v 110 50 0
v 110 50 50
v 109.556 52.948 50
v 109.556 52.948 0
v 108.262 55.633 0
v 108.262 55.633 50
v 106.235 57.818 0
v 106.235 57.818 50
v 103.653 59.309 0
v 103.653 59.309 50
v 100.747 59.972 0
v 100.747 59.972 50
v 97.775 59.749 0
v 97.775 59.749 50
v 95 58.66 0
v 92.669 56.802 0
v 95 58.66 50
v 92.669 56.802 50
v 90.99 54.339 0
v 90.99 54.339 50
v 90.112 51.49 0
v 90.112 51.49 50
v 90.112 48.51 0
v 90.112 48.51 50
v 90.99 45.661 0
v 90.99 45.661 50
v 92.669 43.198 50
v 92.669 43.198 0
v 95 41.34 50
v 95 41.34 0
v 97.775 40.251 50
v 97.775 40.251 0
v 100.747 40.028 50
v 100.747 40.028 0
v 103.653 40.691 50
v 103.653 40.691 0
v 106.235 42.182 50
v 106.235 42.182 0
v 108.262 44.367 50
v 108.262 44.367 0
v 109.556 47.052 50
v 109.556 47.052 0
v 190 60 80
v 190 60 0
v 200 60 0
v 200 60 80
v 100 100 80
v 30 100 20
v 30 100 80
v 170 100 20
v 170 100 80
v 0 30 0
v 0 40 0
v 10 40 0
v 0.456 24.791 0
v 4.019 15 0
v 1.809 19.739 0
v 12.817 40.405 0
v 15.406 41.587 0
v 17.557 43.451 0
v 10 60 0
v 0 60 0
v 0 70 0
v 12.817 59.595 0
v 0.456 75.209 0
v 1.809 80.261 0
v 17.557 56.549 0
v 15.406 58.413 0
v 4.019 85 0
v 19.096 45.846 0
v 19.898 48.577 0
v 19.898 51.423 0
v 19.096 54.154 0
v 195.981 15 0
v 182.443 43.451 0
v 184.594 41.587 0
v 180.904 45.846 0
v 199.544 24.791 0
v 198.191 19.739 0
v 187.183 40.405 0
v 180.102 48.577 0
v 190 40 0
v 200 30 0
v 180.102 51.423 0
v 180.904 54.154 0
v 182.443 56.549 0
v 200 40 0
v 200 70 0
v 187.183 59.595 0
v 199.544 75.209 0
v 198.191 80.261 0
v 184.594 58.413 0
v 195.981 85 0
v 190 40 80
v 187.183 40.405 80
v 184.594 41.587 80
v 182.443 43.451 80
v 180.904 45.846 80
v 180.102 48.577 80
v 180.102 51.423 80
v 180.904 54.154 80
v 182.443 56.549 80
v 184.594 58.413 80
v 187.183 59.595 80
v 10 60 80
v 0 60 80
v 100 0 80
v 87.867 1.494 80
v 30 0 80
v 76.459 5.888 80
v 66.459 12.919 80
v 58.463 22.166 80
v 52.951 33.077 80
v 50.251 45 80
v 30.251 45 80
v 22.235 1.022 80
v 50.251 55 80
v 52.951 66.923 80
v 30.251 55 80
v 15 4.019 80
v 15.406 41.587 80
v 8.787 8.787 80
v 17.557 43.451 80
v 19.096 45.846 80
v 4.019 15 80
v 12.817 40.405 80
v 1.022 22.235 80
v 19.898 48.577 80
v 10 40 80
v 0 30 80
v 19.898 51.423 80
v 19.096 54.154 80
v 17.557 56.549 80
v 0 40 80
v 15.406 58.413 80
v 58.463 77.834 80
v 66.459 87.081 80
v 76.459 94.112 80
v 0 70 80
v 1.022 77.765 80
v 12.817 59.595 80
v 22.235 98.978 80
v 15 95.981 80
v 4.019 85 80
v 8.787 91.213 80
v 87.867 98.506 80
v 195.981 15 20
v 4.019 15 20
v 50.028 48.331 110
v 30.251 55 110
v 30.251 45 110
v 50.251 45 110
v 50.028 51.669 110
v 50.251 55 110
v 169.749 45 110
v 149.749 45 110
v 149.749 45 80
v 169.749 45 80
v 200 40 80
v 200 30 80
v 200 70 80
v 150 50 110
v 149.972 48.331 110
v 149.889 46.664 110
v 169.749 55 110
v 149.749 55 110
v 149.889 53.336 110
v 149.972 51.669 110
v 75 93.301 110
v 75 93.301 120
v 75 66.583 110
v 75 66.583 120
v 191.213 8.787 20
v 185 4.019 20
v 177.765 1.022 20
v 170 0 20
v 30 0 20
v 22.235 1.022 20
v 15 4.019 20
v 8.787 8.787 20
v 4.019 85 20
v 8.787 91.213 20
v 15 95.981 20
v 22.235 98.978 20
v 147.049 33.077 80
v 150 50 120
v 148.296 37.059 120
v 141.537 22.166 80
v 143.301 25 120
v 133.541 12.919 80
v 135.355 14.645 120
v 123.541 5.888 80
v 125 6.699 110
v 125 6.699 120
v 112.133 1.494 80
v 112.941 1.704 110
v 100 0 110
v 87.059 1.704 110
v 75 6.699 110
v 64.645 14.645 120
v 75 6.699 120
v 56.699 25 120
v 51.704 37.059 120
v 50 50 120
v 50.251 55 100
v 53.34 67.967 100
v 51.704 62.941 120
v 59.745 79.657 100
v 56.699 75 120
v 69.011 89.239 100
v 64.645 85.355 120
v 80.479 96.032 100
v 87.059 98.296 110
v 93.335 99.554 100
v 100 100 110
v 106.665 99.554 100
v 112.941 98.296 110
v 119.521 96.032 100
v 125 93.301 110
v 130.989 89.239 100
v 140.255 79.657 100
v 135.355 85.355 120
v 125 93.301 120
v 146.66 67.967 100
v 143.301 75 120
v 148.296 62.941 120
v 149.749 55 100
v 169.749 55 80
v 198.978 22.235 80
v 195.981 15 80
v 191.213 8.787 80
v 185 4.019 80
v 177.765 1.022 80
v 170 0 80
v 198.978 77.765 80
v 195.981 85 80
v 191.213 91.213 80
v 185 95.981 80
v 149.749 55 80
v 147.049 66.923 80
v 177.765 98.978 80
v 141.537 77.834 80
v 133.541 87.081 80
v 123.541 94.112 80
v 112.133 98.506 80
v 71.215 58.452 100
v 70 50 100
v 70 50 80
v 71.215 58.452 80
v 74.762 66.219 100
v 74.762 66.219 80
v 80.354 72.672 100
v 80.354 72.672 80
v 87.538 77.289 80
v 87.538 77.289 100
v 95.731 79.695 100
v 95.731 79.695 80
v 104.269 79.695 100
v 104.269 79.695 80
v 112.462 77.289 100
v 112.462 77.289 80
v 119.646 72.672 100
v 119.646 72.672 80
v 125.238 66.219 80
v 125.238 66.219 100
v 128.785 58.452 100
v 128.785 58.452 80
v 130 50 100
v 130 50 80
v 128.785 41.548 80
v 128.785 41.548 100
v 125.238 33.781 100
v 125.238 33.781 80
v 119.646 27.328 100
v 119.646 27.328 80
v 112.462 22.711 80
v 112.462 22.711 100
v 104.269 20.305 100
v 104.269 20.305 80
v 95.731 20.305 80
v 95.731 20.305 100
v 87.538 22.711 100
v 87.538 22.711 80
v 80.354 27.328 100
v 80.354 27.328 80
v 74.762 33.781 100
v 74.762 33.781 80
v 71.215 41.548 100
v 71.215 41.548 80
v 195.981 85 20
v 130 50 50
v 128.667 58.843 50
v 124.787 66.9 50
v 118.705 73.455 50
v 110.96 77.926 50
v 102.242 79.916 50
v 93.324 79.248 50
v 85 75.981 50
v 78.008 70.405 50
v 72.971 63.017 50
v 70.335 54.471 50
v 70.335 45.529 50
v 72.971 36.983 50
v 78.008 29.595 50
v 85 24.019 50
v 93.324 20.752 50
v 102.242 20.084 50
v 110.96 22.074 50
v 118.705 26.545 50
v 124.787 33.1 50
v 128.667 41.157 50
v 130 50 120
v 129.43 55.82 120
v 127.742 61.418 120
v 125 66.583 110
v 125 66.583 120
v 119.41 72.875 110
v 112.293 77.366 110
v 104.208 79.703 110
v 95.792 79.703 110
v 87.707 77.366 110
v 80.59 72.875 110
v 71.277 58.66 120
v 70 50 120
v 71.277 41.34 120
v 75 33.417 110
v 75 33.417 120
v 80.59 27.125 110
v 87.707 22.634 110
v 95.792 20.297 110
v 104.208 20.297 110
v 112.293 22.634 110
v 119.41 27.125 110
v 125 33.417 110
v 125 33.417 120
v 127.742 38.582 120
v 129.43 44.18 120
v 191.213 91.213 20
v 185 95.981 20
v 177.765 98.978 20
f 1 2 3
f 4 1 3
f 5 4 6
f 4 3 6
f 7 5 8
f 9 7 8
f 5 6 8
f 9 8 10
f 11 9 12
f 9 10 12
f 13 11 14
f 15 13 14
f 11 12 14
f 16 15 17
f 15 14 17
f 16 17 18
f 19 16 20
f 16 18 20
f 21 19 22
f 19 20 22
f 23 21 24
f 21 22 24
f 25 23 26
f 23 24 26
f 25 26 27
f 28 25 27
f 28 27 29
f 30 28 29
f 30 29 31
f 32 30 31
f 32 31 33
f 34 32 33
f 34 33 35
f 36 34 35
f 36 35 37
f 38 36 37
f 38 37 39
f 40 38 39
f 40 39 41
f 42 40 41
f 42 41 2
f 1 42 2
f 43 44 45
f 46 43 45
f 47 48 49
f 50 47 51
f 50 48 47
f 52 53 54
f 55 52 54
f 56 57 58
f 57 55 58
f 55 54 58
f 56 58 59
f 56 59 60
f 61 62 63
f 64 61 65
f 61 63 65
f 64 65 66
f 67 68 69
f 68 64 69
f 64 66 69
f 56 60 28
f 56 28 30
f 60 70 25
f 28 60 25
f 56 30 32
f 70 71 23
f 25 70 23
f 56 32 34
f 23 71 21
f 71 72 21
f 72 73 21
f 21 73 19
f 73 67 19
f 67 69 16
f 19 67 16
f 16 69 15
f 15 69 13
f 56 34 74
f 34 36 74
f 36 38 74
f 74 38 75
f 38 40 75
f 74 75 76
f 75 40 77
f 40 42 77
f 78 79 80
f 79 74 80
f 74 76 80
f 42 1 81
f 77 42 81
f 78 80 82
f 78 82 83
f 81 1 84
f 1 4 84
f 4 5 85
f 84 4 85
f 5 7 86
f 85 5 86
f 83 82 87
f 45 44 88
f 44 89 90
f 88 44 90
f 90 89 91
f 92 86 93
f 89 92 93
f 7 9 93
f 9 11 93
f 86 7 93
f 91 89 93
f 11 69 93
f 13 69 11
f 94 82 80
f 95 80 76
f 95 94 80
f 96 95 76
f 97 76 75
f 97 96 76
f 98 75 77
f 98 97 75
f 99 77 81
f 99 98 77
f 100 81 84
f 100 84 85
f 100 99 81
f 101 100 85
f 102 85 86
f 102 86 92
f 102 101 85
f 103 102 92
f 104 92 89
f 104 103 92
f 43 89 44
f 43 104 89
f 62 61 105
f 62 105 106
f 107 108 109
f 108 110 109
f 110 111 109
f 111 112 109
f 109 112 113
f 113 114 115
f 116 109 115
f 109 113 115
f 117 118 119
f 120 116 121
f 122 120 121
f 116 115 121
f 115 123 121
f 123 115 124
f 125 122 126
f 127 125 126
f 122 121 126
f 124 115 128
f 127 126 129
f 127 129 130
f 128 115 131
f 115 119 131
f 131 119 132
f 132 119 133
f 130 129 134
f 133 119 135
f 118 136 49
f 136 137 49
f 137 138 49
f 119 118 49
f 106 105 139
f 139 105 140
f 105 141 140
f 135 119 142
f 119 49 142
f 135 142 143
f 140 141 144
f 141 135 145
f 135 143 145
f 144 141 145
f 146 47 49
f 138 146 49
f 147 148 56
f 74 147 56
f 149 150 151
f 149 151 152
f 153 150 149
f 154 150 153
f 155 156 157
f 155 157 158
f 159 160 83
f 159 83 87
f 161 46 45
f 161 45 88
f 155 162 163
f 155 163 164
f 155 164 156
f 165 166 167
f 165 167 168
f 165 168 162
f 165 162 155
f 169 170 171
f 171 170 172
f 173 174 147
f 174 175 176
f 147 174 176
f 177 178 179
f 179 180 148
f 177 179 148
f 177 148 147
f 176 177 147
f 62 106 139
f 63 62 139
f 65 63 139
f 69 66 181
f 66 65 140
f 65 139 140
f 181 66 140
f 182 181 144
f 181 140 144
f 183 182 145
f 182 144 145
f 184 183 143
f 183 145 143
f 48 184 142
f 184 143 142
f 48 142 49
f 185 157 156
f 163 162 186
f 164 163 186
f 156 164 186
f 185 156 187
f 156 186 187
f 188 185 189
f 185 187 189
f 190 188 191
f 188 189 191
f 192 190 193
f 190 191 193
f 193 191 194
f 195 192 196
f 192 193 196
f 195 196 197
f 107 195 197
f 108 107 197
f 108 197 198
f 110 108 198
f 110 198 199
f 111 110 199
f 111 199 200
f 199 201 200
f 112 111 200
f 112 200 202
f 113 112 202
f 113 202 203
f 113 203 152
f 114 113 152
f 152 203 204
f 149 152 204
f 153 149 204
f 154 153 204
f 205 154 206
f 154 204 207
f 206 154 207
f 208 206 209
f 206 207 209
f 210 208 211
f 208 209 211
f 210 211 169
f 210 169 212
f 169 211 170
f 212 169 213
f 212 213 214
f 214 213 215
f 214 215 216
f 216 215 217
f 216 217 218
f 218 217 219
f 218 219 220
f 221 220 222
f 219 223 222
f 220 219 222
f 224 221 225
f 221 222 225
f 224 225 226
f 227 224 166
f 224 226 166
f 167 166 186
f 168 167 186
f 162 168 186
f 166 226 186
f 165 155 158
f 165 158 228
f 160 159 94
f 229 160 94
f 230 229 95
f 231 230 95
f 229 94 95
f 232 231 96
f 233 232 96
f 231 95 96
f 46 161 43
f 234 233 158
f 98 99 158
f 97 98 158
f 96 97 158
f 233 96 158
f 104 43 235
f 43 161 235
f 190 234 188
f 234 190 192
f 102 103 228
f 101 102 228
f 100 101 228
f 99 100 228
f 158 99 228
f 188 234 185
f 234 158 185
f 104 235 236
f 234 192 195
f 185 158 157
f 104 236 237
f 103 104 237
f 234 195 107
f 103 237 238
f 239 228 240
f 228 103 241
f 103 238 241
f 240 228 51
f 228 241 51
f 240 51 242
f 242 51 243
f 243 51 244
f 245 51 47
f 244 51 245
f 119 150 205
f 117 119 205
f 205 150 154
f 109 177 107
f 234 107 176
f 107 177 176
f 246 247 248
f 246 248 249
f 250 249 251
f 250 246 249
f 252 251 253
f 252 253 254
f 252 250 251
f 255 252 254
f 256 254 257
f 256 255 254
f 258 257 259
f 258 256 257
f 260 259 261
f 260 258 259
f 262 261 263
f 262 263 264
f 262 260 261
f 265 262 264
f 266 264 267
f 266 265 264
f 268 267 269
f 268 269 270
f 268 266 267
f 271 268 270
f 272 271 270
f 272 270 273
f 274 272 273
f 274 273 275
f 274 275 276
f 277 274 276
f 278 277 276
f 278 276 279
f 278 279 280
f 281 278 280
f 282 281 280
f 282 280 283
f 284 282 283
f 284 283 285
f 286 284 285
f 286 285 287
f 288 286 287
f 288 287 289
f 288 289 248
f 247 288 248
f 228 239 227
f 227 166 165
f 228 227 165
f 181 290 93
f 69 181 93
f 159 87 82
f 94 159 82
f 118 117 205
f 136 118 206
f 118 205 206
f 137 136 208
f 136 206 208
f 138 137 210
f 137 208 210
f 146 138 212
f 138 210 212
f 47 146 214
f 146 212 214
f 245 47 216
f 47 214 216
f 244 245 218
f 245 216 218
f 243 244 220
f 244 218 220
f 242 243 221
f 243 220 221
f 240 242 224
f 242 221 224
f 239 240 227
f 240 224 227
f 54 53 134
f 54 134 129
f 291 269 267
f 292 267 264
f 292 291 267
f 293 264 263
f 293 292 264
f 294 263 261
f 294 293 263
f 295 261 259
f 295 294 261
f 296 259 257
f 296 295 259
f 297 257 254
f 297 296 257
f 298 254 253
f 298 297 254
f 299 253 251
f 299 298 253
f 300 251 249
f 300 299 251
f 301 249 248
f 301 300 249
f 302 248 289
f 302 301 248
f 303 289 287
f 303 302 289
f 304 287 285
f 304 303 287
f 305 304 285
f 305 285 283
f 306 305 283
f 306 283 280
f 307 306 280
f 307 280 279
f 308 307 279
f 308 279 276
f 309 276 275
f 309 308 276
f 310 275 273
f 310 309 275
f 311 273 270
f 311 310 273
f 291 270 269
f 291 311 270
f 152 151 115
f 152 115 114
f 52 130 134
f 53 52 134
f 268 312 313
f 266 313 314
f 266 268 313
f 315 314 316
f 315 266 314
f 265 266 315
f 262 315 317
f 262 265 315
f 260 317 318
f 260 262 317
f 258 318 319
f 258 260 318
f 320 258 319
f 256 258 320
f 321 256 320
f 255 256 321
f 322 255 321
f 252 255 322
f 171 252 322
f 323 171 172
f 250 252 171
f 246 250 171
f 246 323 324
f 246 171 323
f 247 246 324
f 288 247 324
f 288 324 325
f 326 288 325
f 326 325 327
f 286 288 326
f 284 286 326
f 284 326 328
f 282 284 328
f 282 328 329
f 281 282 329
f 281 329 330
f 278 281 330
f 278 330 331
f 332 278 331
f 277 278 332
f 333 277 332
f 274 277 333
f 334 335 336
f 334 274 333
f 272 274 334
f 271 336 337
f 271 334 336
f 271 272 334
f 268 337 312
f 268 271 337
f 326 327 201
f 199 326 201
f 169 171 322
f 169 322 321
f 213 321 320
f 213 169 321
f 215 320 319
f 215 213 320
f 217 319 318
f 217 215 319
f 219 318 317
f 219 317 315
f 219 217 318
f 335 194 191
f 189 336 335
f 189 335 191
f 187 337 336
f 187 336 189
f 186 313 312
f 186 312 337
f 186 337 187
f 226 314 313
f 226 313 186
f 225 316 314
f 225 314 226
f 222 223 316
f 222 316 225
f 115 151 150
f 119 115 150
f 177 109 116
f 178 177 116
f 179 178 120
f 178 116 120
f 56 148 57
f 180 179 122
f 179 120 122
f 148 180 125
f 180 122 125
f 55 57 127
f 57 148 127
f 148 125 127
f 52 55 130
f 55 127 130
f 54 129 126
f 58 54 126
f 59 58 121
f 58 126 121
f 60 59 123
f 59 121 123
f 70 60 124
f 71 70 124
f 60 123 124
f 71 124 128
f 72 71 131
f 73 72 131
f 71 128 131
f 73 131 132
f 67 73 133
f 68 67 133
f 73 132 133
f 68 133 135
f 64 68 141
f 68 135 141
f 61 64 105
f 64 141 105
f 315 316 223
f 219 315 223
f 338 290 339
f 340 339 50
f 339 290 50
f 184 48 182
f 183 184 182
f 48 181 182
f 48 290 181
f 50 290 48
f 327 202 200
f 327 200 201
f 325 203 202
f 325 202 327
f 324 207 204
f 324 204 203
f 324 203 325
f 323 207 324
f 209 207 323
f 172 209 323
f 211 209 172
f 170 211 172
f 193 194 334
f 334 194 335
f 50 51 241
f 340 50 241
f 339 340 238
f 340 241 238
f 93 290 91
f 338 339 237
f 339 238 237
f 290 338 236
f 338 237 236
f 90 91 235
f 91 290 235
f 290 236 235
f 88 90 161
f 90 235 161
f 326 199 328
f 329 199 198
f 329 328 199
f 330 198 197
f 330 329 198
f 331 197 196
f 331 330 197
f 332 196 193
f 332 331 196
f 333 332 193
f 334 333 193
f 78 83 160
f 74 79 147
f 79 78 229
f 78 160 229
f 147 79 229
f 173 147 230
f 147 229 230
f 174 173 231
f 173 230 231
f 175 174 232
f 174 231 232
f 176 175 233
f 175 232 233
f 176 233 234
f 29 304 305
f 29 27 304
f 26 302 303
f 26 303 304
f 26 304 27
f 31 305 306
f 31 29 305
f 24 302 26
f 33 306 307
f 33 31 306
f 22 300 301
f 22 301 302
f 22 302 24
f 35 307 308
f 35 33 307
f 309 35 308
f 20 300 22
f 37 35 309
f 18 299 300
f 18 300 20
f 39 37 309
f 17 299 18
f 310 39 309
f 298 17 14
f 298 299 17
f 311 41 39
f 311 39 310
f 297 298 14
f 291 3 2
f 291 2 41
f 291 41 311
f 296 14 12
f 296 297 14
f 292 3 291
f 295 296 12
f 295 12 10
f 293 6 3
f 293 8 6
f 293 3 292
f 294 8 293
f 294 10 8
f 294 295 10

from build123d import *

# Parameters (mm, degrees)
SKETCH1_W           = 200
SKETCH1_H           = 100
BOSS_EXTRUDE1_DEPTH = 100
CUT_EXTRUDE2_DEPTH  = 100
CUT_EXTRUDE3_DEPTH  = 100
SKETCH4_W           = 20
SKETCH4_H           = 15
CUT_EXTRUDE8_DEPTH  = 275
SKETCH8_R           = 10
CUT_EXTRUDE9_DEPTH  = 275
SKETCH9_R           = 30
SKETCH9_R_2         = 10
CUT_EXTRUDE10_DEPTH = 50
SKETCH10_R          = 50
SKETCH10_R_2        = 30
BOSS_EXTRUDE2_DEPTH = 20
CUT_EXTRUDE12_DEPTH = 10
SKETCH12_W          = 20
SKETCH12_H          = 10
BOSS_EXTRUDE3_DEPTH = 10
SKETCH13_W          = 20
SKETCH13_H          = 10
BOSS_EXTRUDE4_DEPTH = 10
CUT_EXTRUDE13_DEPTH = 20
SKETCH15_R          = 50
SKETCH15_R_2        = 30
BOSS_EXTRUDE5_DEPTH = 20
SKETCH16_W          = 20
SKETCH16_H          = 10
BOSS_EXTRUDE6_DEPTH = 30


with BuildPart() as part:
    # Sketch1 → Boss-Extrude1 (new body)
    with BuildSketch(Plane.XY):
        with Locations((100, 50)):
            Rectangle(SKETCH1_W, SKETCH1_H)
    extrude(amount=BOSS_EXTRUDE1_DEPTH)

    # Sketch2 → Cut-Extrude2 (cut)
    with BuildSketch(Plane.XY.offset(100)):
        with BuildLine():
            Line((30, 100), (0, 100))
            Line((0, 100), (0, 70))
            ThreePointArc((0, 70), (8.786796564, 91.213203436), (30, 100))
        make_face()
        with BuildLine():
            Line((200, 100), (170, 100))
            ThreePointArc((170, 100), (191.213203436, 91.213203436), (200, 70))
            Line((200, 70), (200, 100))
        make_face()
        with BuildLine():
            Line((200, 0), (200, 30))
            ThreePointArc((200, 30), (191.213203436, 8.786796564), (170, 0))
            Line((170, 0), (200, 0))
        make_face()
        with BuildLine():
            ThreePointArc((30, 0), (8.786796564, 8.786796564), (0, 30))
            Line((0, 30), (0, 0))
            Line((0, 0), (30, 0))
        make_face()
    extrude(amount=-CUT_EXTRUDE2_DEPTH, mode=Mode.SUBTRACT)

    # Sketch3 → Cut-Extrude3 (cut)
    with BuildSketch(Plane.XY.offset(100)):
        with BuildLine():
            Line((10, 60), (0, 60))
            Line((0, 60), (0, 40))
            Line((0, 40), (10, 40))
            ThreePointArc((10, 40), (20, 50), (10, 60))
        make_face()
        with BuildLine():
            Line((190, 60), (200, 60))
            Line((200, 60), (200, 40))
            Line((200, 40), (190, 40))
            ThreePointArc((190, 40), (180, 50), (190, 60))
        make_face()
    extrude(amount=-CUT_EXTRUDE3_DEPTH, mode=Mode.SUBTRACT)

    # Sketch4 → Cut-Extrude8 (cut)
    with BuildSketch(Plane(origin=(0, 0, 0), x_dir=(0, 0, -1), z_dir=(1, 0, 0))):
        with Locations((-10, 92.5)):
            Rectangle(SKETCH4_W, SKETCH4_H)
        with Locations((-10, 7.5)):
            Rectangle(SKETCH4_W, SKETCH4_H)
    extrude(amount=CUT_EXTRUDE8_DEPTH, mode=Mode.SUBTRACT)

    # Sketch8 → Cut-Extrude9 (cut)
    with BuildSketch(Plane.XY.offset(100)):
        with Locations((100, 50)):
            Circle(SKETCH8_R)
    extrude(amount=-CUT_EXTRUDE9_DEPTH, mode=Mode.SUBTRACT)

    # Sketch9 → Cut-Extrude10 (cut)
    with BuildSketch(Plane.XY.offset(100)):
        with Locations((100, 50)):
            Circle(SKETCH9_R)
        with Locations((100, 50)):
            Circle(SKETCH9_R_2, mode=Mode.SUBTRACT)
    extrude(amount=-CUT_EXTRUDE10_DEPTH, mode=Mode.SUBTRACT)

    # Sketch10 → Boss-Extrude2 (add)
    with BuildSketch(Plane.XY.offset(100)):
        with Locations((100, 50)):
            Circle(SKETCH10_R)
        with Locations((100, 50)):
            Circle(SKETCH10_R_2, mode=Mode.SUBTRACT)
    extrude(amount=BOSS_EXTRUDE2_DEPTH)

    # Sketch11 → Cut-Extrude12 (cut)
    with BuildSketch(Plane.XY.offset(120)):
        with BuildLine():
            ThreePointArc((125, 93.301270189), (100, 100), (75, 93.301270189))
            Line((75, 93.301270189), (75, 66.583123952))
            ThreePointArc((75, 66.583123952), (100, 80), (125, 66.583123952))
            Line((125, 66.583123952), (125, 93.301270189))
        make_face()
        with BuildLine():
            Line((75, 33.416876048), (75, 6.698729811))
            ThreePointArc((75, 6.698729811), (100, 0), (125, 6.698729811))
            Line((125, 6.698729811), (125, 33.416876048))
            ThreePointArc((125, 33.416876048), (100, 20), (75, 33.416876048))
        make_face()
    extrude(amount=-CUT_EXTRUDE12_DEPTH, mode=Mode.SUBTRACT)

    # Sketch12 → Boss-Extrude3 (add)
    with BuildSketch(Plane.XY.offset(100)):
        with Locations((40.250628145, 50)):
            Rectangle(SKETCH12_W, SKETCH12_H)
    extrude(amount=BOSS_EXTRUDE3_DEPTH)

    # Sketch13 → Boss-Extrude4 (add)
    with BuildSketch(Plane.XY.offset(100)):
        with Locations((159.749371855, 50)):
            Rectangle(SKETCH13_W, SKETCH13_H)
    extrude(amount=BOSS_EXTRUDE4_DEPTH)

    # Sketch14 → Cut-Extrude13 (cut)
    with BuildSketch(Plane.XY.offset(100)):
        with BuildLine():
            ThreePointArc((200, 30), (191.213203436, 8.786796564), (170, 0))
            Line((170, 0), (170, 100))
            ThreePointArc((170, 100), (191.213203436, 91.213203436), (200, 70))
            Line((200, 70), (200, 60))
            Line((200, 60), (190, 60))
            ThreePointArc((190, 60), (180, 50), (190, 40))
            Line((190, 40), (200, 40))
            Line((200, 40), (200, 30))
        make_face()
        with BuildLine():
            Line((170, 100), (100, 100))
            ThreePointArc((100, 100), (66.458980338, 87.080992435), (50.250628145, 55))
            Line((50.250628145, 55), (30.250628145, 55))
            Line((30.250628145, 55), (30.250628145, 45))
            Line((30.250628145, 45), (50.250628145, 45))
            ThreePointArc((50.250628145, 45), (66.458980338, 12.919007565), (100, 0))
            Line((100, 0), (170, 0))
            Line((170, 0), (170, 100))
        make_face()
        with BuildLine():
            Line((30, 100), (30, 0))
            Line((30, 0), (100, 0))
            ThreePointArc((100, 0), (66.458980338, 12.919007565), (50.250628145, 45))
            Line((50.250628145, 45), (30.250628145, 45))
            Line((30.250628145, 45), (30.250628145, 55))
            Line((30.250628145, 55), (50.250628145, 55))
            ThreePointArc((50.250628145, 55), (66.458980338, 87.080992435), (100, 100))
            Line((100, 100), (30, 100))
        make_face()
        with BuildLine():
            Line((30, 100), (30, 0))
            ThreePointArc((30, 0), (8.786796564, 8.786796564), (0, 30))
            Line((0, 30), (0, 40))
            Line((0, 40), (10, 40))
            ThreePointArc((10, 40), (20, 50), (10, 60))
            Line((10, 60), (0, 60))
            Line((0, 60), (0, 70))
            ThreePointArc((0, 70), (8.786796564, 91.213203436), (30, 100))
        make_face()
    extrude(amount=-CUT_EXTRUDE13_DEPTH, mode=Mode.SUBTRACT)

    # Sketch15 → Boss-Extrude5 (add)
    with BuildSketch(Plane(origin=(0, 0, 100), x_dir=(-1, 0, 0), z_dir=(0, 0, -1))):
        with Locations((-100, 50)):
            Circle(SKETCH15_R)
        with Locations((-100, 50)):
            Circle(SKETCH15_R_2, mode=Mode.SUBTRACT)
    extrude(amount=BOSS_EXTRUDE5_DEPTH)

    # Sketch16 → Boss-Extrude6 (add)
    with BuildSketch(Plane.XY.offset(110)):
        with Locations((40.250628145, 50)):
            Rectangle(SKETCH16_W, SKETCH16_H)
        with Locations((159.749371855, 50)):
            Rectangle(SKETCH16_W, SKETCH16_H)
    extrude(amount=-BOSS_EXTRUDE6_DEPTH)


solid = part.part
